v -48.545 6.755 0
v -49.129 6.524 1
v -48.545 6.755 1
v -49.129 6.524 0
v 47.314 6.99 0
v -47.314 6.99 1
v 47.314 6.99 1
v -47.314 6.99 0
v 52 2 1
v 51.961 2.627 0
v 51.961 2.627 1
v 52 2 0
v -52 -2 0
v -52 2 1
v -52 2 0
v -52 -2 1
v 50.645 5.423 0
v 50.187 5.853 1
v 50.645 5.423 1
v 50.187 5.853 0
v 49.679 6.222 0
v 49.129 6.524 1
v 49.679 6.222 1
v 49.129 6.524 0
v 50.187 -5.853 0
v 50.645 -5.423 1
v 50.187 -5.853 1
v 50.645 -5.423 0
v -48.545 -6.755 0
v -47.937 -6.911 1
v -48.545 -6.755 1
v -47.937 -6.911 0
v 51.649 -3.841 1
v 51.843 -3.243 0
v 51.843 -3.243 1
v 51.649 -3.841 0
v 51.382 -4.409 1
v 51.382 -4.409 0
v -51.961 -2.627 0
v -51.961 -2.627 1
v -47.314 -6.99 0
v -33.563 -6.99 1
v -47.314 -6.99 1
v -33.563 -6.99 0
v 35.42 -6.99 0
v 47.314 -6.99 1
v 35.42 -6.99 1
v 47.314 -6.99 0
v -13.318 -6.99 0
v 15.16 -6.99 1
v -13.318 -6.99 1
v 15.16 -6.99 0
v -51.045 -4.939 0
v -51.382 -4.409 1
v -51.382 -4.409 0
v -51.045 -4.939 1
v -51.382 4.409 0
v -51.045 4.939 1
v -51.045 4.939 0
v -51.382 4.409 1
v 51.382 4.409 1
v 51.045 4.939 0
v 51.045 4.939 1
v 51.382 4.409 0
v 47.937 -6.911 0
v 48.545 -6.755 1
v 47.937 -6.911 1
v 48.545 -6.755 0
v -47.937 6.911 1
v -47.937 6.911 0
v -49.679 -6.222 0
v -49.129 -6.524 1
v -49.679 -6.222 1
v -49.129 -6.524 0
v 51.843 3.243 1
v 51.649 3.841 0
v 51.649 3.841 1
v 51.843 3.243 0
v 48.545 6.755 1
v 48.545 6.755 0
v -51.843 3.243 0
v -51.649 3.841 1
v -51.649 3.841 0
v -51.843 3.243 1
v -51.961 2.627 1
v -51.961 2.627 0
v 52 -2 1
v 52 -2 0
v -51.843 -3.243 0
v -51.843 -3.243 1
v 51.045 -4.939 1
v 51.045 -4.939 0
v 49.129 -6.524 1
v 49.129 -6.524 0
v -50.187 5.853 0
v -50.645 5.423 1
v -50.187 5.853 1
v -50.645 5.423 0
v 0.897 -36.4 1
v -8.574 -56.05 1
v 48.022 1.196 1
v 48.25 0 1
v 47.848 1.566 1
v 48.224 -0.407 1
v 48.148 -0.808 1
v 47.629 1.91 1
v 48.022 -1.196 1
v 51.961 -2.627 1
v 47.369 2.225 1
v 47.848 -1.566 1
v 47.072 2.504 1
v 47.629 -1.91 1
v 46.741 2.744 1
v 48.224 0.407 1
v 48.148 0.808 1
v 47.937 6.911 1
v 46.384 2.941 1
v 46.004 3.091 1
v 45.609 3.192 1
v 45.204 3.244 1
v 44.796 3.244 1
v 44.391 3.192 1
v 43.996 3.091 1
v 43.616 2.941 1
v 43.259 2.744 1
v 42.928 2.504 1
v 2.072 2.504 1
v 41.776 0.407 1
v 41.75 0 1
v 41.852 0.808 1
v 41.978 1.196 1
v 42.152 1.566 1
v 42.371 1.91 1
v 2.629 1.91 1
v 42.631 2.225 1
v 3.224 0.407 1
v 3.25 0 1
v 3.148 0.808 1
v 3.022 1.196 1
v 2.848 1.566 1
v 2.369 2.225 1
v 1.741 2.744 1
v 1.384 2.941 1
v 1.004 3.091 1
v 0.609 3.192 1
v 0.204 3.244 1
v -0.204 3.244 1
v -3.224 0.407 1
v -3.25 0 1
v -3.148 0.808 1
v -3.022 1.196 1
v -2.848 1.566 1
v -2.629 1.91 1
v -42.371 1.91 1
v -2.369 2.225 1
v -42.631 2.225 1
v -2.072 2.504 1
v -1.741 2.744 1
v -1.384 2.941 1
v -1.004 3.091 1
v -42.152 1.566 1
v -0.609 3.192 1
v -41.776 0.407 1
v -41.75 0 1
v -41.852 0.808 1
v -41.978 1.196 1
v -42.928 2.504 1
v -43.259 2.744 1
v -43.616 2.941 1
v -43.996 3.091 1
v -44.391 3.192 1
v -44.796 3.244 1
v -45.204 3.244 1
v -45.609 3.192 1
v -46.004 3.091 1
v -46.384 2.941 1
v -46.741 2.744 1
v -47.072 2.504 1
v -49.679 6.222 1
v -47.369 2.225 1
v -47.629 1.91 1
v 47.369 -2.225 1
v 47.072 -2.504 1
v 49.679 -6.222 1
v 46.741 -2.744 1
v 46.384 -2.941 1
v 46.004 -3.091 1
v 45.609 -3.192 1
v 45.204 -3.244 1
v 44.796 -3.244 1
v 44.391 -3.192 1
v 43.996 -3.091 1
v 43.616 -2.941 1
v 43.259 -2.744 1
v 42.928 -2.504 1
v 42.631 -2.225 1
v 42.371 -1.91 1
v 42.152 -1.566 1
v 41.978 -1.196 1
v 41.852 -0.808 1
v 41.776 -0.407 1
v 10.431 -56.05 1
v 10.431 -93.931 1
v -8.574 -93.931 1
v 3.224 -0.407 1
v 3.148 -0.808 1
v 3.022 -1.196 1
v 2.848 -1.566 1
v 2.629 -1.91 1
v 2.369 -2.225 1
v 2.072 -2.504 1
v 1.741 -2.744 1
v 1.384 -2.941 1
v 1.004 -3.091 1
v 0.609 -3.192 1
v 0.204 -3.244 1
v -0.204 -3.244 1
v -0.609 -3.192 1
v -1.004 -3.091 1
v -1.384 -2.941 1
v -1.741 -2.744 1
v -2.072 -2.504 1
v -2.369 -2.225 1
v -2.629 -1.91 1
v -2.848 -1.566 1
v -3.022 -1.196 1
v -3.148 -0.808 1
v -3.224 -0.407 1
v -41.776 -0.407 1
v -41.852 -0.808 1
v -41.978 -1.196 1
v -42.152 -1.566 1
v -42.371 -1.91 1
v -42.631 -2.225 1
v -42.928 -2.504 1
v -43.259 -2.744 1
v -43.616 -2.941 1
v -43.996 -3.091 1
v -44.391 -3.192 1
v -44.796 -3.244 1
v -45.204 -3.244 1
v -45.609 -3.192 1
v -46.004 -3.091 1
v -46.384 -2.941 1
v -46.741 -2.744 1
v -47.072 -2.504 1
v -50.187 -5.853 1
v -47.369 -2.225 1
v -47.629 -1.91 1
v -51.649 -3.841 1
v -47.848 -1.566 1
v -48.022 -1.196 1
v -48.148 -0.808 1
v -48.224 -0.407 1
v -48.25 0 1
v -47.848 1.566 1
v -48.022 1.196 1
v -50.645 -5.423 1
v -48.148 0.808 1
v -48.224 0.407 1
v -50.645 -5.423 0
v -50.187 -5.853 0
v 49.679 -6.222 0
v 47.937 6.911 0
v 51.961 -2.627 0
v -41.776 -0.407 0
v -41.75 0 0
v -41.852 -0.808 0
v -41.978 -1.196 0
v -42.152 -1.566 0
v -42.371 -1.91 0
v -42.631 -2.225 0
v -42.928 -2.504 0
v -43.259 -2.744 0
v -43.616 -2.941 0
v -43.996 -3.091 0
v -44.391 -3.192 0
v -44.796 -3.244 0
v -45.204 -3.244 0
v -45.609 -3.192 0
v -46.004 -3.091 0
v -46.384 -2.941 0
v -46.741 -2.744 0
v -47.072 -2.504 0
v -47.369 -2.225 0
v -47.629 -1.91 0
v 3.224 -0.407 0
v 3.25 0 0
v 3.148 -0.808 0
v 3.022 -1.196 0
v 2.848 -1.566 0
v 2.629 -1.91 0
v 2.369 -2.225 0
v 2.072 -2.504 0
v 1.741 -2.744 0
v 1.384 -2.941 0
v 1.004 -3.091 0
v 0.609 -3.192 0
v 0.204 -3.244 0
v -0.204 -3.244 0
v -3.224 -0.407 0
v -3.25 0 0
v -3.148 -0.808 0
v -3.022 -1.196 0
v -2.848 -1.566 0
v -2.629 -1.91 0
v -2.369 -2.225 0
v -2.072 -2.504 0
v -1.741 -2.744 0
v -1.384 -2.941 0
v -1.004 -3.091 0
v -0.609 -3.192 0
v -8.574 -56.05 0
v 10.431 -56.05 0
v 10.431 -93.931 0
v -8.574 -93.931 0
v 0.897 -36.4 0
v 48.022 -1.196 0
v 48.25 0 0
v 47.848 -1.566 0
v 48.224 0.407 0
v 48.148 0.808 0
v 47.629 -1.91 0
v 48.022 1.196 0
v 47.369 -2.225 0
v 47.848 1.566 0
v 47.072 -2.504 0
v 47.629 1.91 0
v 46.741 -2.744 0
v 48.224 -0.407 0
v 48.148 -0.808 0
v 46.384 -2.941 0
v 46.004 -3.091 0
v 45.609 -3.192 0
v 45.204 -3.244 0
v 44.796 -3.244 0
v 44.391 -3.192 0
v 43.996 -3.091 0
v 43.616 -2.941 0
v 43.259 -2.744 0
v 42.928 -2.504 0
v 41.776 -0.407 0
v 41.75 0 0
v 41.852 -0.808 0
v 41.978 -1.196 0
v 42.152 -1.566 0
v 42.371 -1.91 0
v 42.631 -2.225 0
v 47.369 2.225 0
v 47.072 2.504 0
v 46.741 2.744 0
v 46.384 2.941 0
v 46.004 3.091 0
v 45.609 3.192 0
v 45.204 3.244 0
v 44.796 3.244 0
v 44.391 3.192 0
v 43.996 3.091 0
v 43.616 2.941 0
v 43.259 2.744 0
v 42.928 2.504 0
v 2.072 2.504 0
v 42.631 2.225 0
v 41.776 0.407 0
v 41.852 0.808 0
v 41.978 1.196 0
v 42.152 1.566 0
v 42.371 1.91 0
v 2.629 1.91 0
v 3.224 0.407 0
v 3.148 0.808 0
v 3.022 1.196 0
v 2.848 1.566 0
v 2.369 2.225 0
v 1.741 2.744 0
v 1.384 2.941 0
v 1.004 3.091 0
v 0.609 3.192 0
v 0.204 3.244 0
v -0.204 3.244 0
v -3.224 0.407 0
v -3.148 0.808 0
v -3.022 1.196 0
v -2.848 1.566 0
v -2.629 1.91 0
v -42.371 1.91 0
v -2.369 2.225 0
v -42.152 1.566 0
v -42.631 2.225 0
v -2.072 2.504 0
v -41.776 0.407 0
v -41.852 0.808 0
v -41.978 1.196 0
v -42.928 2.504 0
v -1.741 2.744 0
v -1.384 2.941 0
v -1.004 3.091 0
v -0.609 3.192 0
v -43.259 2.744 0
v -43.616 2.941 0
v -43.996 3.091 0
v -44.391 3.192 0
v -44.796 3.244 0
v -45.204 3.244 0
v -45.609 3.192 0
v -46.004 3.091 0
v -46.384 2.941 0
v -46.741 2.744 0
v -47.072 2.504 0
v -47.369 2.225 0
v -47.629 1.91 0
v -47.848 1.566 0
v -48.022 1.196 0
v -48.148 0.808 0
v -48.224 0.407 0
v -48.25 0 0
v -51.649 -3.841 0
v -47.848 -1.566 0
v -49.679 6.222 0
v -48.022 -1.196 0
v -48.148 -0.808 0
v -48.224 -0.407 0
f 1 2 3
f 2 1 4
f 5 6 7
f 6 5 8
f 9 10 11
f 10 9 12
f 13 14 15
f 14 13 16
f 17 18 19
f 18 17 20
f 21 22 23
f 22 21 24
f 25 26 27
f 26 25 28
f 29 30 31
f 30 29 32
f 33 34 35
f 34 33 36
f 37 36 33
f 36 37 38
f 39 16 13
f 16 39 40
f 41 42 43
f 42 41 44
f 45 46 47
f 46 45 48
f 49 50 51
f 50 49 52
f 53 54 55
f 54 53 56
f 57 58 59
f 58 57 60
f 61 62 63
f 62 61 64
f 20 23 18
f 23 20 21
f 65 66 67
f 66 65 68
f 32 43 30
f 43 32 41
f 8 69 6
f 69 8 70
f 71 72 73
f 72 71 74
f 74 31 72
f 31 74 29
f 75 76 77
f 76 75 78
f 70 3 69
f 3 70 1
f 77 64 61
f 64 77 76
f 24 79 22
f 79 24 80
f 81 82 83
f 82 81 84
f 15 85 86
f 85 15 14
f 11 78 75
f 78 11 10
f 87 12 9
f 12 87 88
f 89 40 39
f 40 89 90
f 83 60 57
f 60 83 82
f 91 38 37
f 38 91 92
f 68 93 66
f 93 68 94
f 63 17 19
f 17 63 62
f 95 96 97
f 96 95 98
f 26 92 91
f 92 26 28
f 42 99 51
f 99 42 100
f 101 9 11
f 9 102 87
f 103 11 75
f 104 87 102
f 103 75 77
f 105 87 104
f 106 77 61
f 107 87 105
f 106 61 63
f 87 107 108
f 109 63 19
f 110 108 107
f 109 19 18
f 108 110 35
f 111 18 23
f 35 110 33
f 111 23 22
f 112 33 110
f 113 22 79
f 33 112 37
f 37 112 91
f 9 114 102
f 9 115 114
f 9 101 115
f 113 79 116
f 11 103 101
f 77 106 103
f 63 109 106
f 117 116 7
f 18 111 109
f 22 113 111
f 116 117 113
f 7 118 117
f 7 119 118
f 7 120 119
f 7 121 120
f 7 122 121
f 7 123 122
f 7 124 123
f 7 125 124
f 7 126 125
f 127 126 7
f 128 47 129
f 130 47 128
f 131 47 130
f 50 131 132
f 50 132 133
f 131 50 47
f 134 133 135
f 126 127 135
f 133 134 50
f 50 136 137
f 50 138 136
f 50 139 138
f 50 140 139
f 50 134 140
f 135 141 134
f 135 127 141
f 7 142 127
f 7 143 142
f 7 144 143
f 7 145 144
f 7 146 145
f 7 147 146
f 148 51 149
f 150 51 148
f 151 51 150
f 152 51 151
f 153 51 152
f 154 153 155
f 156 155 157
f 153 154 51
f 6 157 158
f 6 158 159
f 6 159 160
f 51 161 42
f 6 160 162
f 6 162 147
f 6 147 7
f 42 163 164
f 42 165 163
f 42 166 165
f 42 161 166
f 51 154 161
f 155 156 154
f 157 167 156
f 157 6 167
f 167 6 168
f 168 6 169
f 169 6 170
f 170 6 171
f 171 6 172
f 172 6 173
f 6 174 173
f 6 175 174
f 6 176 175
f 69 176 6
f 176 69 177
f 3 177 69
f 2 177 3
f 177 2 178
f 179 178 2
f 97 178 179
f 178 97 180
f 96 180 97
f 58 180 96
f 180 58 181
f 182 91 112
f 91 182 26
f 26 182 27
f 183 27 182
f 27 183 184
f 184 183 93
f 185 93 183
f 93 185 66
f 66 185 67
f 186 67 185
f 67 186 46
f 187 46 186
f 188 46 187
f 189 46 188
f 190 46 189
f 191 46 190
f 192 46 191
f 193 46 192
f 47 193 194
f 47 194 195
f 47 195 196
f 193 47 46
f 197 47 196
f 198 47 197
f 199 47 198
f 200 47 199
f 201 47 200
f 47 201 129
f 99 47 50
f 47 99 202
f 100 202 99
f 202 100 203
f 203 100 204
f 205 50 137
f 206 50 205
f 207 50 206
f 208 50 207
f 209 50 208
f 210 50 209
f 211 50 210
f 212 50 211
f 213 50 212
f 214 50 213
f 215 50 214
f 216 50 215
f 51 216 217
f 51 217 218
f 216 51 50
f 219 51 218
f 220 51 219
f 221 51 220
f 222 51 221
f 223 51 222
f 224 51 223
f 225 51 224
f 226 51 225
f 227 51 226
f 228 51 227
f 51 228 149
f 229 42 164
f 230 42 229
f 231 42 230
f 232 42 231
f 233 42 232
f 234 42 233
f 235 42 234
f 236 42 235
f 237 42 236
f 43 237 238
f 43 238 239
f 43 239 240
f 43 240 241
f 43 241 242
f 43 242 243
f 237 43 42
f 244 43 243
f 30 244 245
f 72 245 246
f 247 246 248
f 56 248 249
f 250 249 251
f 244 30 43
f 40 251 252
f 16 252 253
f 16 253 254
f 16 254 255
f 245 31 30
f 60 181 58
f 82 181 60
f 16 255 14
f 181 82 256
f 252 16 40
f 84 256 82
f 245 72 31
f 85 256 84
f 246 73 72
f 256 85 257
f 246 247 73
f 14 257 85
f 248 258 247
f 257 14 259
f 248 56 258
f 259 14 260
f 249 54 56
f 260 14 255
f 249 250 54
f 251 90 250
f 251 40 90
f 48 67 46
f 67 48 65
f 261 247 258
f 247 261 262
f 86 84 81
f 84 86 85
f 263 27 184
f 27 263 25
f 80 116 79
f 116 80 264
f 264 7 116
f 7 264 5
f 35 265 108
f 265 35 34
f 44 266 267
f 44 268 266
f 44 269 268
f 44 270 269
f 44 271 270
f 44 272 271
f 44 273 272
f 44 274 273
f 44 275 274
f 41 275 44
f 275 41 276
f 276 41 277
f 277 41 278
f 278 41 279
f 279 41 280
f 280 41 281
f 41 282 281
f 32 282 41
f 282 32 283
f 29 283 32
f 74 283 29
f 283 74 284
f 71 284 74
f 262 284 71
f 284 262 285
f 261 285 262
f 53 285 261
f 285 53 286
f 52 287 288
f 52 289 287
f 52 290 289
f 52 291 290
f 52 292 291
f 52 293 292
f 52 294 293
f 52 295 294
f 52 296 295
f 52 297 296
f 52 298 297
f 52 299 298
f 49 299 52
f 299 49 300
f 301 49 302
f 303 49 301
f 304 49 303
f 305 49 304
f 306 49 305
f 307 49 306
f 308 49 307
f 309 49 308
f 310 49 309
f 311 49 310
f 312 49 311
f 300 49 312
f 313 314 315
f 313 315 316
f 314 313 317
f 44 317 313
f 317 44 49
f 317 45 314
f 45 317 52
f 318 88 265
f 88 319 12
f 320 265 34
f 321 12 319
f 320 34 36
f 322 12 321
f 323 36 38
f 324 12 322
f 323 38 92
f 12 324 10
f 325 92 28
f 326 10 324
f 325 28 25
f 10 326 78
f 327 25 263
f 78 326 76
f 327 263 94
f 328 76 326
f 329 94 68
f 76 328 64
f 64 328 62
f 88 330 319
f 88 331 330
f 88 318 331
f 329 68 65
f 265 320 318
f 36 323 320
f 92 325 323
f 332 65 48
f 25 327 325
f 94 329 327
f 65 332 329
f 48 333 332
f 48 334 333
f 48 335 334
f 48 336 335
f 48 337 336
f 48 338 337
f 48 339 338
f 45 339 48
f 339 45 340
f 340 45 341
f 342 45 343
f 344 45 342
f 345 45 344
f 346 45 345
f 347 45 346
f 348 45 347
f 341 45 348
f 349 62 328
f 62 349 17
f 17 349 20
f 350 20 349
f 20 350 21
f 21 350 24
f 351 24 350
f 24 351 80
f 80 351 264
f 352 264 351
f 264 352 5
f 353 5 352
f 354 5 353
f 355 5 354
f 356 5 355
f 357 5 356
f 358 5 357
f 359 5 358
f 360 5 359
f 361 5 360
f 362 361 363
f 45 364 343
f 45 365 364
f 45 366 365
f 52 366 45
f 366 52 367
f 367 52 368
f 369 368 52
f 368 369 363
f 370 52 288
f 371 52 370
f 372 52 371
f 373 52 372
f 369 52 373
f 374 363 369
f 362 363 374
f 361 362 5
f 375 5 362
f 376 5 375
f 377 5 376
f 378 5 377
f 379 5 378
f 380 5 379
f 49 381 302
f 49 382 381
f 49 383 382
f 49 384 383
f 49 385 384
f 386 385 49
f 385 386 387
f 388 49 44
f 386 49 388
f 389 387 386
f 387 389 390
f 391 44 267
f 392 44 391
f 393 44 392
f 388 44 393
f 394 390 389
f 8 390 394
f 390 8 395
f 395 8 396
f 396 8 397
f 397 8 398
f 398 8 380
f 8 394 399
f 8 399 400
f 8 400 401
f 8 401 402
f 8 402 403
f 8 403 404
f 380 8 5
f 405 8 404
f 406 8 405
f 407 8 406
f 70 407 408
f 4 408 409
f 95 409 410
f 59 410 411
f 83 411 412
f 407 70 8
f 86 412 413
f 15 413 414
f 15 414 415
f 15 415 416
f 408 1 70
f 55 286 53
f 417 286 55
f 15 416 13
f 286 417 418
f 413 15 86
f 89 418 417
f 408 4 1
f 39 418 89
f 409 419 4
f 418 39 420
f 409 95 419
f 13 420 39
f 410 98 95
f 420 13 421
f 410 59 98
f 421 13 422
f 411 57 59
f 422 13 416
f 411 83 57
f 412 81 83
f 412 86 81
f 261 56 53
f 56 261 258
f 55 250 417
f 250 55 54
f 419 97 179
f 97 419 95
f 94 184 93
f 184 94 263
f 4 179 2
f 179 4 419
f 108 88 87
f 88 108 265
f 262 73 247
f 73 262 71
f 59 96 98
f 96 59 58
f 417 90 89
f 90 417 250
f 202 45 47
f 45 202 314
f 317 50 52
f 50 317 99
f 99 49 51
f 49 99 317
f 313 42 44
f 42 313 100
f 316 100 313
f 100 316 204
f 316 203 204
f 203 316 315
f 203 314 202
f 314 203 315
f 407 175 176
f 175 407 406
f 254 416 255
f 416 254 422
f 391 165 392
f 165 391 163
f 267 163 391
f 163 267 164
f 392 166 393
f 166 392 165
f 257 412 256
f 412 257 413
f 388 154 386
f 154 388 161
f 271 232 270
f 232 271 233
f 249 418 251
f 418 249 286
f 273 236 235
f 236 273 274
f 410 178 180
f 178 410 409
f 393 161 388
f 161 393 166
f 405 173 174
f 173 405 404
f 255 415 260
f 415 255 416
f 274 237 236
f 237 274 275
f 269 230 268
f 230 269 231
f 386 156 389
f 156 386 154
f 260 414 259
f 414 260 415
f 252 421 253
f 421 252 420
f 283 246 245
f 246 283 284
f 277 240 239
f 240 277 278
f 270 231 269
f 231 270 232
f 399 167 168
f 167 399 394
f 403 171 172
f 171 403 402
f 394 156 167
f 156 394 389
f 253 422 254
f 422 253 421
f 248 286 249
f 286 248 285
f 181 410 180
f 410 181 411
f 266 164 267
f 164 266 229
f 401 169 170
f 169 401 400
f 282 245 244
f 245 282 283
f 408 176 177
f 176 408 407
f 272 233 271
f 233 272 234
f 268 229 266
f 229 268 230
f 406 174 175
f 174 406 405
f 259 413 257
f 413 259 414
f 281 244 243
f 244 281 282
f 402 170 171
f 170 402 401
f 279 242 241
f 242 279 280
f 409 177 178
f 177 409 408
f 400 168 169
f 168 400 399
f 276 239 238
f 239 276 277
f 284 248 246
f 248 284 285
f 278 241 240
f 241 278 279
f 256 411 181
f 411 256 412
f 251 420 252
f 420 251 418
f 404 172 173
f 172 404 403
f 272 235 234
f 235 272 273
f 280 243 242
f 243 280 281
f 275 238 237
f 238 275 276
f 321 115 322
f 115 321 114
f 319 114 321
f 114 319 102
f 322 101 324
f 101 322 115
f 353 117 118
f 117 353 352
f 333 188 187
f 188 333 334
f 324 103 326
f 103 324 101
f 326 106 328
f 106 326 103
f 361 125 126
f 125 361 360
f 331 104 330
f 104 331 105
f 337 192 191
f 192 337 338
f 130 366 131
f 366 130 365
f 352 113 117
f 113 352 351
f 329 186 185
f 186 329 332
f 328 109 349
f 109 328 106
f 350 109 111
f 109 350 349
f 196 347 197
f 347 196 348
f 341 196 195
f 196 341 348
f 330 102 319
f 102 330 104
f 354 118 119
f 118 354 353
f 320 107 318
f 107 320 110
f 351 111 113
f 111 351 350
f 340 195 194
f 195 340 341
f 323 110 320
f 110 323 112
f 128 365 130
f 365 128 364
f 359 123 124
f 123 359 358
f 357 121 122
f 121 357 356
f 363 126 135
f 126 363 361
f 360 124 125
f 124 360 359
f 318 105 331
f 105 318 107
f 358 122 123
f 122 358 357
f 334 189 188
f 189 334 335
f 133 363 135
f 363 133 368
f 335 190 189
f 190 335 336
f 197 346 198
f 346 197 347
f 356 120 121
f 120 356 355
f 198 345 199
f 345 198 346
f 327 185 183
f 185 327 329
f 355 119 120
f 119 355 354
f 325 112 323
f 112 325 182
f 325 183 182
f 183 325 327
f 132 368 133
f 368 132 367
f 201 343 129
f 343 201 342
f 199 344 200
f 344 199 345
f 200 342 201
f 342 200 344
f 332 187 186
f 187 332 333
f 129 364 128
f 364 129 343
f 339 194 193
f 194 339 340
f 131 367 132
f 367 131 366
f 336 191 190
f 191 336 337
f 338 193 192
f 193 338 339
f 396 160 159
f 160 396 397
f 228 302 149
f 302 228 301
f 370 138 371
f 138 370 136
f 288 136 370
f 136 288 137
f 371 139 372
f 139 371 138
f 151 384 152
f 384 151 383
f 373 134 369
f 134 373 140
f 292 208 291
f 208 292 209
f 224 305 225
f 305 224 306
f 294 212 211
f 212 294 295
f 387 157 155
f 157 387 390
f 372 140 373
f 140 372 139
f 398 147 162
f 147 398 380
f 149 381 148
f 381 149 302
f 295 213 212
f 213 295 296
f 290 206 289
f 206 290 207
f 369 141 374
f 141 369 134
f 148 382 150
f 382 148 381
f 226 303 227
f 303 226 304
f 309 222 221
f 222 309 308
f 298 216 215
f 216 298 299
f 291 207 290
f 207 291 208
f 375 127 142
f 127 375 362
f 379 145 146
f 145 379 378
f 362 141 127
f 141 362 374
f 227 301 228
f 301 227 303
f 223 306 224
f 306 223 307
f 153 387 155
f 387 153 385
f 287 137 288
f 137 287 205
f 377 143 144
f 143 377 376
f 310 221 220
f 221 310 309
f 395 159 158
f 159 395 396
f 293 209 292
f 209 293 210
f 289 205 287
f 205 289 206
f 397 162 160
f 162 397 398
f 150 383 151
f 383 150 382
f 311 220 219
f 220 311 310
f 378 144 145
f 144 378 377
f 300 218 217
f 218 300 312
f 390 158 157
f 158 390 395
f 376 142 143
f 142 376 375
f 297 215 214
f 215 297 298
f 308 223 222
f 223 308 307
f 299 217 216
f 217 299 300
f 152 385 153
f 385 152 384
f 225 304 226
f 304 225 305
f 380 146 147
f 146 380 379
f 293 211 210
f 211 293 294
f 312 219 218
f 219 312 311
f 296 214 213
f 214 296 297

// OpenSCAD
$fn = 50;


difference() {
	union() {
		translate(v = [0, 0, 0]) {
			rotate(a = [0, 0, 0]) {
				hull() {
					translate(v = [-47.0000000000, 2.0000000000, 0]) {
						rotate(a = [0, 0, 0]) {
							translate(v = [0, 0, 0]) {
								rotate(a = [0, 0, 0]) {
									cylinder(h = 1, r = 5);
								}
							}
						}
					}
					translate(v = [47.0000000000, 2.0000000000, 0]) {
						rotate(a = [0, 0, 0]) {
							translate(v = [0, 0, 0]) {
								rotate(a = [0, 0, 0]) {
									cylinder(h = 1, r = 5);
								}
							}
						}
					}
					translate(v = [-47.0000000000, -2.0000000000, 0]) {
						rotate(a = [0, 0, 0]) {
							translate(v = [0, 0, 0]) {
								rotate(a = [0, 0, 0]) {
									cylinder(h = 1, r = 5);
								}
							}
						}
					}
					translate(v = [47.0000000000, -2.0000000000, 0]) {
						rotate(a = [0, 0, 0]) {
							translate(v = [0, 0, 0]) {
								rotate(a = [0, 0, 0]) {
									cylinder(h = 1, r = 5);
								}
							}
						}
					}
				}
			}
		}
		translate(v = [0, 0, 0]) {
			rotate(a = [0, 0, 0]) {
				linear_extrude(height = 1) {
					text(font = "DejaVu Sans Mono:style=Bold", halign = "center", size = 95, text = "Y", valign = "top");
				}
			}
		}
	}
	union() {
		translate(v = [-45.0000000000, 0.0000000000, -125.0000000000]) {
			rotate(a = [0, 0, 0]) {
				cylinder(h = 250, r = 3.2500000000);
			}
		}
		translate(v = [45.0000000000, 0.0000000000, -125.0000000000]) {
			rotate(a = [0, 0, 0]) {
				cylinder(h = 250, r = 3.2500000000);
			}
		}
		translate(v = [45.0000000000, 0.0000000000, -125.0000000000]) {
			rotate(a = [0, 0, 0]) {
				cylinder(h = 250, r = 3.2500000000);
			}
		}
		translate(v = [0, 0, -125.0000000000]) {
			rotate(a = [0, 0, 0]) {
				cylinder(h = 250, r = 3.2500000000);
			}
		}
	}
}
